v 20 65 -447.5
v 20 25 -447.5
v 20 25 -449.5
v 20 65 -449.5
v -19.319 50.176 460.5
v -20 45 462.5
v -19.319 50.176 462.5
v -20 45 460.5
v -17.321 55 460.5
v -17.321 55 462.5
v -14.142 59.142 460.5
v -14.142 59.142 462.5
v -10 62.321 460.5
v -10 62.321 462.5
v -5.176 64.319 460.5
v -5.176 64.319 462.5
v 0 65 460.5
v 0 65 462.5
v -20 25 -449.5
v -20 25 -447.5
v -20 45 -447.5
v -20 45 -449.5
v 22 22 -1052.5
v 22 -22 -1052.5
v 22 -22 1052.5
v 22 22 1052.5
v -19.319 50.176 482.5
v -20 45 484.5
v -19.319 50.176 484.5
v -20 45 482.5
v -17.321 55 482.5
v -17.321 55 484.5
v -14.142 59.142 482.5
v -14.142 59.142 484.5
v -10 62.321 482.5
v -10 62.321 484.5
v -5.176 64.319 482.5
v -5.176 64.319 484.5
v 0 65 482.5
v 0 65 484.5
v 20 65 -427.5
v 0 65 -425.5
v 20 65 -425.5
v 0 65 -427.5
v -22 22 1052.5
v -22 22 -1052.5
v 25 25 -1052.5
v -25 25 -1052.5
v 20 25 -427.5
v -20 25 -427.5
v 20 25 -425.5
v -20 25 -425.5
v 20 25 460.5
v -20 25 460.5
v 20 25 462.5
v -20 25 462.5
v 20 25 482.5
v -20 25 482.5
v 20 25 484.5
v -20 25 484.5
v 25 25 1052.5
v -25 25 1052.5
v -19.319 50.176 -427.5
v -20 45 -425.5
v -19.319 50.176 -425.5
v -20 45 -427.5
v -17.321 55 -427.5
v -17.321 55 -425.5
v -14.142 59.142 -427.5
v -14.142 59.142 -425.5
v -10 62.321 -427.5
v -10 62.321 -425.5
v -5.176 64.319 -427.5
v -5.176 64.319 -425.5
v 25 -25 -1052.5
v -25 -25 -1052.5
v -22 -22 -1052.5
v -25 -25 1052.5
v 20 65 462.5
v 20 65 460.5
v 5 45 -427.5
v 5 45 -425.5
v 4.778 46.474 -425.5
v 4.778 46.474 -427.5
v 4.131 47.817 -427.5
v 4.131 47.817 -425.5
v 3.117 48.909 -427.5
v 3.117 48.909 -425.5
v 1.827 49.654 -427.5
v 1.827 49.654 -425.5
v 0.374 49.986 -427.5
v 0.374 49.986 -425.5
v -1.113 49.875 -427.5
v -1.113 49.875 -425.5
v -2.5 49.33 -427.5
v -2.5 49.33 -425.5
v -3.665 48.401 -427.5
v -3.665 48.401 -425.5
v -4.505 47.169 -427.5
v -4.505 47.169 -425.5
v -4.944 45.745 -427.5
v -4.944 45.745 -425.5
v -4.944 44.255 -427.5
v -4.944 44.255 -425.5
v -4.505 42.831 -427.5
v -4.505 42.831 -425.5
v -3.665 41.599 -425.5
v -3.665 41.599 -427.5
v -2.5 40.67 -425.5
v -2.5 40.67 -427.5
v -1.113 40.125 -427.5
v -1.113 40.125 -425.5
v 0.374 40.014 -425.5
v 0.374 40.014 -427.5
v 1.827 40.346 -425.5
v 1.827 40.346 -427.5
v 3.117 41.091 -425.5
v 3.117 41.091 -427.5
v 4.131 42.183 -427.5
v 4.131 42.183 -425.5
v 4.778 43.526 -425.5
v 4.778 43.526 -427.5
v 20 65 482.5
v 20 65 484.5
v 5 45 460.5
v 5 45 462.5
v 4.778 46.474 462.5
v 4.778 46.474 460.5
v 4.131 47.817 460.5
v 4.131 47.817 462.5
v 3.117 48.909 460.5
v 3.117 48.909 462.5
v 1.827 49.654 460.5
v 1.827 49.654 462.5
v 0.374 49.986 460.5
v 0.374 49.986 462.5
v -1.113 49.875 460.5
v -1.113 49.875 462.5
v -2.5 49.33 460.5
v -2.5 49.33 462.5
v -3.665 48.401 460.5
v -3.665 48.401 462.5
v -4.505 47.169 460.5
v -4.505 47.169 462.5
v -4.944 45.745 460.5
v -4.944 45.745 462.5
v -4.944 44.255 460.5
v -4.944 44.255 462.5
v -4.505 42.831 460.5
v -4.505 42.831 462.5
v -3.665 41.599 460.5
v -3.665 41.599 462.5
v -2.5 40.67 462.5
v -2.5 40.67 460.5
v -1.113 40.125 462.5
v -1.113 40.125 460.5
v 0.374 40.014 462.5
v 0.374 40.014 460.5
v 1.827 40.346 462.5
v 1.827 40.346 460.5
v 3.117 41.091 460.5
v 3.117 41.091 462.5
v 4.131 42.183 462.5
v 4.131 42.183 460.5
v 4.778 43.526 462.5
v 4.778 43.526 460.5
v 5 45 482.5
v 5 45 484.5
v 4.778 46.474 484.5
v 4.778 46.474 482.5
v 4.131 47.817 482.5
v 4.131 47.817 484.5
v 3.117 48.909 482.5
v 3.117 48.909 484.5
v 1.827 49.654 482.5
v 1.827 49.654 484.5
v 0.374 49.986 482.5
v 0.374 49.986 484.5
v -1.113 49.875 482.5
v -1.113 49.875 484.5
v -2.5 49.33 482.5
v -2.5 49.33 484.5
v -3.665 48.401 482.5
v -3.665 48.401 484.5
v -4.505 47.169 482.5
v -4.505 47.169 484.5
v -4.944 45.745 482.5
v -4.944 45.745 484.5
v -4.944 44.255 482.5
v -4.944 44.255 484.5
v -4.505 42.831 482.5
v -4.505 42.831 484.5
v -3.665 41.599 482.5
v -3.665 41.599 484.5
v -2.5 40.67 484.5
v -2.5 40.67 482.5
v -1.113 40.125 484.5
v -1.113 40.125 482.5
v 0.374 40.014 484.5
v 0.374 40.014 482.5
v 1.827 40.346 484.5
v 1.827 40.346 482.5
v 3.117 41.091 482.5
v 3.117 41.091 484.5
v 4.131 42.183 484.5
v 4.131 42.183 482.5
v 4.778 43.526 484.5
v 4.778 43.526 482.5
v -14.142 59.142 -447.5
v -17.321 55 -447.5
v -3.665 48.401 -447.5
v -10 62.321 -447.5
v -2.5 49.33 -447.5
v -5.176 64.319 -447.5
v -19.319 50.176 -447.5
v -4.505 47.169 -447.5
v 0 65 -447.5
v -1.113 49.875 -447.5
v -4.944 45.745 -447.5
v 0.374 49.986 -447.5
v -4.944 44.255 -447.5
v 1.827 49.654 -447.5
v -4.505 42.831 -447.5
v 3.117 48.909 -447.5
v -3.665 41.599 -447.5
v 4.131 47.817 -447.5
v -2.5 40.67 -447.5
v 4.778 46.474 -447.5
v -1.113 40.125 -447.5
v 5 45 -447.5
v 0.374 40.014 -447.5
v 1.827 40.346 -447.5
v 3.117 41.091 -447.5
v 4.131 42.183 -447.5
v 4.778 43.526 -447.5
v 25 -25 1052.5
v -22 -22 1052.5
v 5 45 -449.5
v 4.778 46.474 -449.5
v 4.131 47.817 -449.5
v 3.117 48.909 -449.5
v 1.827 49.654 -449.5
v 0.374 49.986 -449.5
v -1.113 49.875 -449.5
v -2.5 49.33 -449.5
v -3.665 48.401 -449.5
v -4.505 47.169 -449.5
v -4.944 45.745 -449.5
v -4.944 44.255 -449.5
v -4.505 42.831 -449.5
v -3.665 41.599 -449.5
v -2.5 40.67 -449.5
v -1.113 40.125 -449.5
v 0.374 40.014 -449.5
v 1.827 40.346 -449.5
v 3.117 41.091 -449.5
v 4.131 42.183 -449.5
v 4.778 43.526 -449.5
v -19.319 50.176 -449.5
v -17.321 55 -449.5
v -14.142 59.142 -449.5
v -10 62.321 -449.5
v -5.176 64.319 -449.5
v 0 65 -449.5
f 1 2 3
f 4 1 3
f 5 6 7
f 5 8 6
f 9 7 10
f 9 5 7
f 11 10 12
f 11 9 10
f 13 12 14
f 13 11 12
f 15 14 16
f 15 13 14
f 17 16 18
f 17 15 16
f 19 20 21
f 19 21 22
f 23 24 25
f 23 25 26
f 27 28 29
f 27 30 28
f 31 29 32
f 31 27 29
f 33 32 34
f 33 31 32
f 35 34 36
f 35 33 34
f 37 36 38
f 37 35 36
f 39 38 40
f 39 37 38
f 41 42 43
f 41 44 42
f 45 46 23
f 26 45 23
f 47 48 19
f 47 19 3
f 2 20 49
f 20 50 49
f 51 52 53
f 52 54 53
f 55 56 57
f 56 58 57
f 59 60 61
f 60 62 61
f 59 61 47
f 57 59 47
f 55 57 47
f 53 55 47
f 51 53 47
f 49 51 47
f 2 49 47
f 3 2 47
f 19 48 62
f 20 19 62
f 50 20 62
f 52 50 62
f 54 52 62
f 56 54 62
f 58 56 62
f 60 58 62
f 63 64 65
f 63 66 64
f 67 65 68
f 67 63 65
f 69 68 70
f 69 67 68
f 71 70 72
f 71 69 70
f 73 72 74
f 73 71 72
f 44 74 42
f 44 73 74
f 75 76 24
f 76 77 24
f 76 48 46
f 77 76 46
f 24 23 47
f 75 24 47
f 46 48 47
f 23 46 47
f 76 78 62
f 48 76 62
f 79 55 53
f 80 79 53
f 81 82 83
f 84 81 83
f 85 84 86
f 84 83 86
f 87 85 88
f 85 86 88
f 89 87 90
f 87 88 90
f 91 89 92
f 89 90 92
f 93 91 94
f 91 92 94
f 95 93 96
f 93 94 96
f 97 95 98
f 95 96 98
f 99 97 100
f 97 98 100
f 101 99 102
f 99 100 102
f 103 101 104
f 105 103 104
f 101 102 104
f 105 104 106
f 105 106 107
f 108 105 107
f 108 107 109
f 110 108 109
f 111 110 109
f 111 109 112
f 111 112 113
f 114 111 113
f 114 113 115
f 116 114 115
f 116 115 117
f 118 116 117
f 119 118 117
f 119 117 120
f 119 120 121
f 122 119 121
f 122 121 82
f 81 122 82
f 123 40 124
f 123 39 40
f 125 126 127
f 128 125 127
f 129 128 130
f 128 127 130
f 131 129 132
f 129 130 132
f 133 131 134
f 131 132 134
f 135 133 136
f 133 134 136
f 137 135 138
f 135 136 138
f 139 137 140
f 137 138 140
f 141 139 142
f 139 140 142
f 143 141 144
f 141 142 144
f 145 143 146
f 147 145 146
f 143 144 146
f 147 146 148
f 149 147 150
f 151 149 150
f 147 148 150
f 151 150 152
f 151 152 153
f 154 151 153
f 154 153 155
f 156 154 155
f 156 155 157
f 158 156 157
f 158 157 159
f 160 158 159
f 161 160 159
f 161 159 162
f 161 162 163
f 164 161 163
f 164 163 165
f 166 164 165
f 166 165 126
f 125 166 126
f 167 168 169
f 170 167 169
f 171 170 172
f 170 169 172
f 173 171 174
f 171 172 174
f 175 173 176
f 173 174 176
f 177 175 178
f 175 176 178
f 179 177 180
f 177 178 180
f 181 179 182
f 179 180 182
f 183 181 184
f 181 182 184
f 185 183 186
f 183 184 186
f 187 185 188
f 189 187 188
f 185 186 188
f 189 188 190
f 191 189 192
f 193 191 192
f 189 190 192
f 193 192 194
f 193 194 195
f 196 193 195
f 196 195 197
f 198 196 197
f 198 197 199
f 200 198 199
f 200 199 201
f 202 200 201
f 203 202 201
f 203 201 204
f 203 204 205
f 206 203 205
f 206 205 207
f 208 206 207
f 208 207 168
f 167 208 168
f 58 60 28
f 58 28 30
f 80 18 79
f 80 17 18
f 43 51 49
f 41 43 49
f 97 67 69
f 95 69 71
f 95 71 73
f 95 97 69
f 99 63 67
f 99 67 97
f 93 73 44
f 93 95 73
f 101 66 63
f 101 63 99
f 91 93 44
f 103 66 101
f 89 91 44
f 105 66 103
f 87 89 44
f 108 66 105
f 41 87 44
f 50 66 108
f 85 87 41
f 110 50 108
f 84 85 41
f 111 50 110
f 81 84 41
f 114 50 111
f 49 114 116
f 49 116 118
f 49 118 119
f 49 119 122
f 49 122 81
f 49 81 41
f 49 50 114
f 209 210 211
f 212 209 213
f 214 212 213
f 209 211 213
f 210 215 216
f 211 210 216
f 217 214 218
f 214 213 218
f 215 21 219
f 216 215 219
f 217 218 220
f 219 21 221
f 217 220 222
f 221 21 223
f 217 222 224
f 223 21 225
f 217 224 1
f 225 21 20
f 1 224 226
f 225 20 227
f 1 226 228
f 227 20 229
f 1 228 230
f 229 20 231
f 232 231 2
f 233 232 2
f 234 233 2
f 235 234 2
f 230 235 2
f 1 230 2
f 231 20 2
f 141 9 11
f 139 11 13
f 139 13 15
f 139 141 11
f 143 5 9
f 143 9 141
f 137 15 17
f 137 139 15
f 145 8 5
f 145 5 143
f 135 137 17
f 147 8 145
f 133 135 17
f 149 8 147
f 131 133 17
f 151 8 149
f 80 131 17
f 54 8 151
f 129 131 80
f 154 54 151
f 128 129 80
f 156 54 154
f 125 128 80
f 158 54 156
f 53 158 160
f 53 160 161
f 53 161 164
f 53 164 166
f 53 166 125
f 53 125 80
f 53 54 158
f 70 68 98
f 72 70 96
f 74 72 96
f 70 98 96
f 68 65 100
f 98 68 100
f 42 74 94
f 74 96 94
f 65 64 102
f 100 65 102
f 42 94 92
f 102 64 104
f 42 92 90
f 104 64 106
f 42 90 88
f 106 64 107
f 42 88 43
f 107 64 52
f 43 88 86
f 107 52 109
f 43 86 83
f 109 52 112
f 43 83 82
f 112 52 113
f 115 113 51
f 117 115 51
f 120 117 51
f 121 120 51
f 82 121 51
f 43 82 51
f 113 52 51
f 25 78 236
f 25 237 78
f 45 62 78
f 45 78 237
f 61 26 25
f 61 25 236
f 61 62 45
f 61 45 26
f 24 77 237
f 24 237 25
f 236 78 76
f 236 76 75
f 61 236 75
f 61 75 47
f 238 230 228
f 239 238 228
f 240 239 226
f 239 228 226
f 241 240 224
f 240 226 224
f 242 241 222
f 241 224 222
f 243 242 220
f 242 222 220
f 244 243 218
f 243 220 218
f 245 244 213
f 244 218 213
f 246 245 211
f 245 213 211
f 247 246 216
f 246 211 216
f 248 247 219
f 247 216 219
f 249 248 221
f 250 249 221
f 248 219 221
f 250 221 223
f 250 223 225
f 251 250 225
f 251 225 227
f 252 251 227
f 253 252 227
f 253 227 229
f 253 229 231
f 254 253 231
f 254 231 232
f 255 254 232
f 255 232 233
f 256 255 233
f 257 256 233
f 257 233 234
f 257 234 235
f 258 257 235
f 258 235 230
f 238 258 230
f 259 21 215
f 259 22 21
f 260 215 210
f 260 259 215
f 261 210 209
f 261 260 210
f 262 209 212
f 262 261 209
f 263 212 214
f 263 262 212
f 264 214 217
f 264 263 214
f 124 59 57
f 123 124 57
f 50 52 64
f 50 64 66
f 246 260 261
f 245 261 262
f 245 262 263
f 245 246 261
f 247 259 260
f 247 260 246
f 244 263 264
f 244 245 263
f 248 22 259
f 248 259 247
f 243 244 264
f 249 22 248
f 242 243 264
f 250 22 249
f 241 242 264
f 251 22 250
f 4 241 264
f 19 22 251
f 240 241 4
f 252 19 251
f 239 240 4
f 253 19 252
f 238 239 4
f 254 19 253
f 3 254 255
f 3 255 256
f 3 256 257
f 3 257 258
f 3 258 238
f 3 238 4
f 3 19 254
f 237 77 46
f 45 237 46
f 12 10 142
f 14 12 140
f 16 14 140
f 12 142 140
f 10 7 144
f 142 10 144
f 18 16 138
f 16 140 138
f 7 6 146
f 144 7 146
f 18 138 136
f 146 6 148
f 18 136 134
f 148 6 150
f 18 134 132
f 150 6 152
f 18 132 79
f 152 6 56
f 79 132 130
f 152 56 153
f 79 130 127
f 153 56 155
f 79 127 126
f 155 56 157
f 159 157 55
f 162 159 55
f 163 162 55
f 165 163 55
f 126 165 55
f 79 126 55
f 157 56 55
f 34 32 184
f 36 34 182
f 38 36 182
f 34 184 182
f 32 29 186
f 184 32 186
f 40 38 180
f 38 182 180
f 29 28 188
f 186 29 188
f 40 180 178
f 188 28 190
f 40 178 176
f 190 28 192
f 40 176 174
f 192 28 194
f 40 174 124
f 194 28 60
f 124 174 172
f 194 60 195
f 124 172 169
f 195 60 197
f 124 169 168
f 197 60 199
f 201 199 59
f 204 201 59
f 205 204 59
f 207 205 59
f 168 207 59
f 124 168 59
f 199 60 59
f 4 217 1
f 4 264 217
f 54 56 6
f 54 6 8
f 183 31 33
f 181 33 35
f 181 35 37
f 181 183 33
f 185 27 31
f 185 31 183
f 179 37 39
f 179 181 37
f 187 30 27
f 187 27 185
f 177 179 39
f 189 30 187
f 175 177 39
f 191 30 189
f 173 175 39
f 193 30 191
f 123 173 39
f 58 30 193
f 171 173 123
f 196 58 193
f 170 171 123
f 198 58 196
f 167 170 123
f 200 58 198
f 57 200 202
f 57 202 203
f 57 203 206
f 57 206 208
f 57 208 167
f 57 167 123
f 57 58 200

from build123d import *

# Parameters (mm, degrees)
SKETCH3_W           = 50
SKETCH3_H           = 50
SKETCH3_W_2         = 44
SKETCH3_H_2         = 44
BOSS_EXTRUDE1_DEPTH = 1052.5
SKETCH4_W           = 40
SKETCH4_H           = 2
BOSS_EXTRUDE2_DEPTH = 40
SKETCH5_R           = 5
CUT_EXTRUDE1_DEPTH  = 1000
FILLET1_R           = 20


with BuildPart() as part:
    # Sketch3 → Boss-Extrude1 (new, symmetric)
    with BuildSketch(Plane.XY):
        Rectangle(SKETCH3_W, SKETCH3_H)
        Rectangle(SKETCH3_W_2, SKETCH3_H_2, mode=Mode.SUBTRACT)
    extrude(amount=BOSS_EXTRUDE1_DEPTH, both=True)

    # Sketch4 → Boss-Extrude2 (add)
    with BuildSketch(Plane(origin=(0, 25, 0), x_dir=(1, 0, 0), z_dir=(0, 1, 0))):
        with Locations((0, 448.5)):
            Rectangle(SKETCH4_W, SKETCH4_H)
        with Locations((0, 426.5)):
            Rectangle(SKETCH4_W, SKETCH4_H)
        with Locations((0, -461.5)):
            Rectangle(SKETCH4_W, SKETCH4_H)
        with Locations((0, -483.5)):
            Rectangle(SKETCH4_W, SKETCH4_H)
    extrude(amount=BOSS_EXTRUDE2_DEPTH)

    # Sketch5 → Cut-Extrude1 (cut)
    with BuildSketch(Plane.XY.offset(484.5)):
        with Locations((0, 45)):
            Circle(SKETCH5_R)
    extrude(amount=-CUT_EXTRUDE1_DEPTH, mode=Mode.SUBTRACT)

    # Fillet1
    fillet1_edges = [part.edges().sort_by_distance(p)[0] for p in [
        (-20, 65, -448.5),
        (-20, 65, -426.5),
        (-20, 65, 461.5),
        (-20, 65, 483.5),
    ]]
    fillet(fillet1_edges, radius=FILLET1_R)


solid = part.part
